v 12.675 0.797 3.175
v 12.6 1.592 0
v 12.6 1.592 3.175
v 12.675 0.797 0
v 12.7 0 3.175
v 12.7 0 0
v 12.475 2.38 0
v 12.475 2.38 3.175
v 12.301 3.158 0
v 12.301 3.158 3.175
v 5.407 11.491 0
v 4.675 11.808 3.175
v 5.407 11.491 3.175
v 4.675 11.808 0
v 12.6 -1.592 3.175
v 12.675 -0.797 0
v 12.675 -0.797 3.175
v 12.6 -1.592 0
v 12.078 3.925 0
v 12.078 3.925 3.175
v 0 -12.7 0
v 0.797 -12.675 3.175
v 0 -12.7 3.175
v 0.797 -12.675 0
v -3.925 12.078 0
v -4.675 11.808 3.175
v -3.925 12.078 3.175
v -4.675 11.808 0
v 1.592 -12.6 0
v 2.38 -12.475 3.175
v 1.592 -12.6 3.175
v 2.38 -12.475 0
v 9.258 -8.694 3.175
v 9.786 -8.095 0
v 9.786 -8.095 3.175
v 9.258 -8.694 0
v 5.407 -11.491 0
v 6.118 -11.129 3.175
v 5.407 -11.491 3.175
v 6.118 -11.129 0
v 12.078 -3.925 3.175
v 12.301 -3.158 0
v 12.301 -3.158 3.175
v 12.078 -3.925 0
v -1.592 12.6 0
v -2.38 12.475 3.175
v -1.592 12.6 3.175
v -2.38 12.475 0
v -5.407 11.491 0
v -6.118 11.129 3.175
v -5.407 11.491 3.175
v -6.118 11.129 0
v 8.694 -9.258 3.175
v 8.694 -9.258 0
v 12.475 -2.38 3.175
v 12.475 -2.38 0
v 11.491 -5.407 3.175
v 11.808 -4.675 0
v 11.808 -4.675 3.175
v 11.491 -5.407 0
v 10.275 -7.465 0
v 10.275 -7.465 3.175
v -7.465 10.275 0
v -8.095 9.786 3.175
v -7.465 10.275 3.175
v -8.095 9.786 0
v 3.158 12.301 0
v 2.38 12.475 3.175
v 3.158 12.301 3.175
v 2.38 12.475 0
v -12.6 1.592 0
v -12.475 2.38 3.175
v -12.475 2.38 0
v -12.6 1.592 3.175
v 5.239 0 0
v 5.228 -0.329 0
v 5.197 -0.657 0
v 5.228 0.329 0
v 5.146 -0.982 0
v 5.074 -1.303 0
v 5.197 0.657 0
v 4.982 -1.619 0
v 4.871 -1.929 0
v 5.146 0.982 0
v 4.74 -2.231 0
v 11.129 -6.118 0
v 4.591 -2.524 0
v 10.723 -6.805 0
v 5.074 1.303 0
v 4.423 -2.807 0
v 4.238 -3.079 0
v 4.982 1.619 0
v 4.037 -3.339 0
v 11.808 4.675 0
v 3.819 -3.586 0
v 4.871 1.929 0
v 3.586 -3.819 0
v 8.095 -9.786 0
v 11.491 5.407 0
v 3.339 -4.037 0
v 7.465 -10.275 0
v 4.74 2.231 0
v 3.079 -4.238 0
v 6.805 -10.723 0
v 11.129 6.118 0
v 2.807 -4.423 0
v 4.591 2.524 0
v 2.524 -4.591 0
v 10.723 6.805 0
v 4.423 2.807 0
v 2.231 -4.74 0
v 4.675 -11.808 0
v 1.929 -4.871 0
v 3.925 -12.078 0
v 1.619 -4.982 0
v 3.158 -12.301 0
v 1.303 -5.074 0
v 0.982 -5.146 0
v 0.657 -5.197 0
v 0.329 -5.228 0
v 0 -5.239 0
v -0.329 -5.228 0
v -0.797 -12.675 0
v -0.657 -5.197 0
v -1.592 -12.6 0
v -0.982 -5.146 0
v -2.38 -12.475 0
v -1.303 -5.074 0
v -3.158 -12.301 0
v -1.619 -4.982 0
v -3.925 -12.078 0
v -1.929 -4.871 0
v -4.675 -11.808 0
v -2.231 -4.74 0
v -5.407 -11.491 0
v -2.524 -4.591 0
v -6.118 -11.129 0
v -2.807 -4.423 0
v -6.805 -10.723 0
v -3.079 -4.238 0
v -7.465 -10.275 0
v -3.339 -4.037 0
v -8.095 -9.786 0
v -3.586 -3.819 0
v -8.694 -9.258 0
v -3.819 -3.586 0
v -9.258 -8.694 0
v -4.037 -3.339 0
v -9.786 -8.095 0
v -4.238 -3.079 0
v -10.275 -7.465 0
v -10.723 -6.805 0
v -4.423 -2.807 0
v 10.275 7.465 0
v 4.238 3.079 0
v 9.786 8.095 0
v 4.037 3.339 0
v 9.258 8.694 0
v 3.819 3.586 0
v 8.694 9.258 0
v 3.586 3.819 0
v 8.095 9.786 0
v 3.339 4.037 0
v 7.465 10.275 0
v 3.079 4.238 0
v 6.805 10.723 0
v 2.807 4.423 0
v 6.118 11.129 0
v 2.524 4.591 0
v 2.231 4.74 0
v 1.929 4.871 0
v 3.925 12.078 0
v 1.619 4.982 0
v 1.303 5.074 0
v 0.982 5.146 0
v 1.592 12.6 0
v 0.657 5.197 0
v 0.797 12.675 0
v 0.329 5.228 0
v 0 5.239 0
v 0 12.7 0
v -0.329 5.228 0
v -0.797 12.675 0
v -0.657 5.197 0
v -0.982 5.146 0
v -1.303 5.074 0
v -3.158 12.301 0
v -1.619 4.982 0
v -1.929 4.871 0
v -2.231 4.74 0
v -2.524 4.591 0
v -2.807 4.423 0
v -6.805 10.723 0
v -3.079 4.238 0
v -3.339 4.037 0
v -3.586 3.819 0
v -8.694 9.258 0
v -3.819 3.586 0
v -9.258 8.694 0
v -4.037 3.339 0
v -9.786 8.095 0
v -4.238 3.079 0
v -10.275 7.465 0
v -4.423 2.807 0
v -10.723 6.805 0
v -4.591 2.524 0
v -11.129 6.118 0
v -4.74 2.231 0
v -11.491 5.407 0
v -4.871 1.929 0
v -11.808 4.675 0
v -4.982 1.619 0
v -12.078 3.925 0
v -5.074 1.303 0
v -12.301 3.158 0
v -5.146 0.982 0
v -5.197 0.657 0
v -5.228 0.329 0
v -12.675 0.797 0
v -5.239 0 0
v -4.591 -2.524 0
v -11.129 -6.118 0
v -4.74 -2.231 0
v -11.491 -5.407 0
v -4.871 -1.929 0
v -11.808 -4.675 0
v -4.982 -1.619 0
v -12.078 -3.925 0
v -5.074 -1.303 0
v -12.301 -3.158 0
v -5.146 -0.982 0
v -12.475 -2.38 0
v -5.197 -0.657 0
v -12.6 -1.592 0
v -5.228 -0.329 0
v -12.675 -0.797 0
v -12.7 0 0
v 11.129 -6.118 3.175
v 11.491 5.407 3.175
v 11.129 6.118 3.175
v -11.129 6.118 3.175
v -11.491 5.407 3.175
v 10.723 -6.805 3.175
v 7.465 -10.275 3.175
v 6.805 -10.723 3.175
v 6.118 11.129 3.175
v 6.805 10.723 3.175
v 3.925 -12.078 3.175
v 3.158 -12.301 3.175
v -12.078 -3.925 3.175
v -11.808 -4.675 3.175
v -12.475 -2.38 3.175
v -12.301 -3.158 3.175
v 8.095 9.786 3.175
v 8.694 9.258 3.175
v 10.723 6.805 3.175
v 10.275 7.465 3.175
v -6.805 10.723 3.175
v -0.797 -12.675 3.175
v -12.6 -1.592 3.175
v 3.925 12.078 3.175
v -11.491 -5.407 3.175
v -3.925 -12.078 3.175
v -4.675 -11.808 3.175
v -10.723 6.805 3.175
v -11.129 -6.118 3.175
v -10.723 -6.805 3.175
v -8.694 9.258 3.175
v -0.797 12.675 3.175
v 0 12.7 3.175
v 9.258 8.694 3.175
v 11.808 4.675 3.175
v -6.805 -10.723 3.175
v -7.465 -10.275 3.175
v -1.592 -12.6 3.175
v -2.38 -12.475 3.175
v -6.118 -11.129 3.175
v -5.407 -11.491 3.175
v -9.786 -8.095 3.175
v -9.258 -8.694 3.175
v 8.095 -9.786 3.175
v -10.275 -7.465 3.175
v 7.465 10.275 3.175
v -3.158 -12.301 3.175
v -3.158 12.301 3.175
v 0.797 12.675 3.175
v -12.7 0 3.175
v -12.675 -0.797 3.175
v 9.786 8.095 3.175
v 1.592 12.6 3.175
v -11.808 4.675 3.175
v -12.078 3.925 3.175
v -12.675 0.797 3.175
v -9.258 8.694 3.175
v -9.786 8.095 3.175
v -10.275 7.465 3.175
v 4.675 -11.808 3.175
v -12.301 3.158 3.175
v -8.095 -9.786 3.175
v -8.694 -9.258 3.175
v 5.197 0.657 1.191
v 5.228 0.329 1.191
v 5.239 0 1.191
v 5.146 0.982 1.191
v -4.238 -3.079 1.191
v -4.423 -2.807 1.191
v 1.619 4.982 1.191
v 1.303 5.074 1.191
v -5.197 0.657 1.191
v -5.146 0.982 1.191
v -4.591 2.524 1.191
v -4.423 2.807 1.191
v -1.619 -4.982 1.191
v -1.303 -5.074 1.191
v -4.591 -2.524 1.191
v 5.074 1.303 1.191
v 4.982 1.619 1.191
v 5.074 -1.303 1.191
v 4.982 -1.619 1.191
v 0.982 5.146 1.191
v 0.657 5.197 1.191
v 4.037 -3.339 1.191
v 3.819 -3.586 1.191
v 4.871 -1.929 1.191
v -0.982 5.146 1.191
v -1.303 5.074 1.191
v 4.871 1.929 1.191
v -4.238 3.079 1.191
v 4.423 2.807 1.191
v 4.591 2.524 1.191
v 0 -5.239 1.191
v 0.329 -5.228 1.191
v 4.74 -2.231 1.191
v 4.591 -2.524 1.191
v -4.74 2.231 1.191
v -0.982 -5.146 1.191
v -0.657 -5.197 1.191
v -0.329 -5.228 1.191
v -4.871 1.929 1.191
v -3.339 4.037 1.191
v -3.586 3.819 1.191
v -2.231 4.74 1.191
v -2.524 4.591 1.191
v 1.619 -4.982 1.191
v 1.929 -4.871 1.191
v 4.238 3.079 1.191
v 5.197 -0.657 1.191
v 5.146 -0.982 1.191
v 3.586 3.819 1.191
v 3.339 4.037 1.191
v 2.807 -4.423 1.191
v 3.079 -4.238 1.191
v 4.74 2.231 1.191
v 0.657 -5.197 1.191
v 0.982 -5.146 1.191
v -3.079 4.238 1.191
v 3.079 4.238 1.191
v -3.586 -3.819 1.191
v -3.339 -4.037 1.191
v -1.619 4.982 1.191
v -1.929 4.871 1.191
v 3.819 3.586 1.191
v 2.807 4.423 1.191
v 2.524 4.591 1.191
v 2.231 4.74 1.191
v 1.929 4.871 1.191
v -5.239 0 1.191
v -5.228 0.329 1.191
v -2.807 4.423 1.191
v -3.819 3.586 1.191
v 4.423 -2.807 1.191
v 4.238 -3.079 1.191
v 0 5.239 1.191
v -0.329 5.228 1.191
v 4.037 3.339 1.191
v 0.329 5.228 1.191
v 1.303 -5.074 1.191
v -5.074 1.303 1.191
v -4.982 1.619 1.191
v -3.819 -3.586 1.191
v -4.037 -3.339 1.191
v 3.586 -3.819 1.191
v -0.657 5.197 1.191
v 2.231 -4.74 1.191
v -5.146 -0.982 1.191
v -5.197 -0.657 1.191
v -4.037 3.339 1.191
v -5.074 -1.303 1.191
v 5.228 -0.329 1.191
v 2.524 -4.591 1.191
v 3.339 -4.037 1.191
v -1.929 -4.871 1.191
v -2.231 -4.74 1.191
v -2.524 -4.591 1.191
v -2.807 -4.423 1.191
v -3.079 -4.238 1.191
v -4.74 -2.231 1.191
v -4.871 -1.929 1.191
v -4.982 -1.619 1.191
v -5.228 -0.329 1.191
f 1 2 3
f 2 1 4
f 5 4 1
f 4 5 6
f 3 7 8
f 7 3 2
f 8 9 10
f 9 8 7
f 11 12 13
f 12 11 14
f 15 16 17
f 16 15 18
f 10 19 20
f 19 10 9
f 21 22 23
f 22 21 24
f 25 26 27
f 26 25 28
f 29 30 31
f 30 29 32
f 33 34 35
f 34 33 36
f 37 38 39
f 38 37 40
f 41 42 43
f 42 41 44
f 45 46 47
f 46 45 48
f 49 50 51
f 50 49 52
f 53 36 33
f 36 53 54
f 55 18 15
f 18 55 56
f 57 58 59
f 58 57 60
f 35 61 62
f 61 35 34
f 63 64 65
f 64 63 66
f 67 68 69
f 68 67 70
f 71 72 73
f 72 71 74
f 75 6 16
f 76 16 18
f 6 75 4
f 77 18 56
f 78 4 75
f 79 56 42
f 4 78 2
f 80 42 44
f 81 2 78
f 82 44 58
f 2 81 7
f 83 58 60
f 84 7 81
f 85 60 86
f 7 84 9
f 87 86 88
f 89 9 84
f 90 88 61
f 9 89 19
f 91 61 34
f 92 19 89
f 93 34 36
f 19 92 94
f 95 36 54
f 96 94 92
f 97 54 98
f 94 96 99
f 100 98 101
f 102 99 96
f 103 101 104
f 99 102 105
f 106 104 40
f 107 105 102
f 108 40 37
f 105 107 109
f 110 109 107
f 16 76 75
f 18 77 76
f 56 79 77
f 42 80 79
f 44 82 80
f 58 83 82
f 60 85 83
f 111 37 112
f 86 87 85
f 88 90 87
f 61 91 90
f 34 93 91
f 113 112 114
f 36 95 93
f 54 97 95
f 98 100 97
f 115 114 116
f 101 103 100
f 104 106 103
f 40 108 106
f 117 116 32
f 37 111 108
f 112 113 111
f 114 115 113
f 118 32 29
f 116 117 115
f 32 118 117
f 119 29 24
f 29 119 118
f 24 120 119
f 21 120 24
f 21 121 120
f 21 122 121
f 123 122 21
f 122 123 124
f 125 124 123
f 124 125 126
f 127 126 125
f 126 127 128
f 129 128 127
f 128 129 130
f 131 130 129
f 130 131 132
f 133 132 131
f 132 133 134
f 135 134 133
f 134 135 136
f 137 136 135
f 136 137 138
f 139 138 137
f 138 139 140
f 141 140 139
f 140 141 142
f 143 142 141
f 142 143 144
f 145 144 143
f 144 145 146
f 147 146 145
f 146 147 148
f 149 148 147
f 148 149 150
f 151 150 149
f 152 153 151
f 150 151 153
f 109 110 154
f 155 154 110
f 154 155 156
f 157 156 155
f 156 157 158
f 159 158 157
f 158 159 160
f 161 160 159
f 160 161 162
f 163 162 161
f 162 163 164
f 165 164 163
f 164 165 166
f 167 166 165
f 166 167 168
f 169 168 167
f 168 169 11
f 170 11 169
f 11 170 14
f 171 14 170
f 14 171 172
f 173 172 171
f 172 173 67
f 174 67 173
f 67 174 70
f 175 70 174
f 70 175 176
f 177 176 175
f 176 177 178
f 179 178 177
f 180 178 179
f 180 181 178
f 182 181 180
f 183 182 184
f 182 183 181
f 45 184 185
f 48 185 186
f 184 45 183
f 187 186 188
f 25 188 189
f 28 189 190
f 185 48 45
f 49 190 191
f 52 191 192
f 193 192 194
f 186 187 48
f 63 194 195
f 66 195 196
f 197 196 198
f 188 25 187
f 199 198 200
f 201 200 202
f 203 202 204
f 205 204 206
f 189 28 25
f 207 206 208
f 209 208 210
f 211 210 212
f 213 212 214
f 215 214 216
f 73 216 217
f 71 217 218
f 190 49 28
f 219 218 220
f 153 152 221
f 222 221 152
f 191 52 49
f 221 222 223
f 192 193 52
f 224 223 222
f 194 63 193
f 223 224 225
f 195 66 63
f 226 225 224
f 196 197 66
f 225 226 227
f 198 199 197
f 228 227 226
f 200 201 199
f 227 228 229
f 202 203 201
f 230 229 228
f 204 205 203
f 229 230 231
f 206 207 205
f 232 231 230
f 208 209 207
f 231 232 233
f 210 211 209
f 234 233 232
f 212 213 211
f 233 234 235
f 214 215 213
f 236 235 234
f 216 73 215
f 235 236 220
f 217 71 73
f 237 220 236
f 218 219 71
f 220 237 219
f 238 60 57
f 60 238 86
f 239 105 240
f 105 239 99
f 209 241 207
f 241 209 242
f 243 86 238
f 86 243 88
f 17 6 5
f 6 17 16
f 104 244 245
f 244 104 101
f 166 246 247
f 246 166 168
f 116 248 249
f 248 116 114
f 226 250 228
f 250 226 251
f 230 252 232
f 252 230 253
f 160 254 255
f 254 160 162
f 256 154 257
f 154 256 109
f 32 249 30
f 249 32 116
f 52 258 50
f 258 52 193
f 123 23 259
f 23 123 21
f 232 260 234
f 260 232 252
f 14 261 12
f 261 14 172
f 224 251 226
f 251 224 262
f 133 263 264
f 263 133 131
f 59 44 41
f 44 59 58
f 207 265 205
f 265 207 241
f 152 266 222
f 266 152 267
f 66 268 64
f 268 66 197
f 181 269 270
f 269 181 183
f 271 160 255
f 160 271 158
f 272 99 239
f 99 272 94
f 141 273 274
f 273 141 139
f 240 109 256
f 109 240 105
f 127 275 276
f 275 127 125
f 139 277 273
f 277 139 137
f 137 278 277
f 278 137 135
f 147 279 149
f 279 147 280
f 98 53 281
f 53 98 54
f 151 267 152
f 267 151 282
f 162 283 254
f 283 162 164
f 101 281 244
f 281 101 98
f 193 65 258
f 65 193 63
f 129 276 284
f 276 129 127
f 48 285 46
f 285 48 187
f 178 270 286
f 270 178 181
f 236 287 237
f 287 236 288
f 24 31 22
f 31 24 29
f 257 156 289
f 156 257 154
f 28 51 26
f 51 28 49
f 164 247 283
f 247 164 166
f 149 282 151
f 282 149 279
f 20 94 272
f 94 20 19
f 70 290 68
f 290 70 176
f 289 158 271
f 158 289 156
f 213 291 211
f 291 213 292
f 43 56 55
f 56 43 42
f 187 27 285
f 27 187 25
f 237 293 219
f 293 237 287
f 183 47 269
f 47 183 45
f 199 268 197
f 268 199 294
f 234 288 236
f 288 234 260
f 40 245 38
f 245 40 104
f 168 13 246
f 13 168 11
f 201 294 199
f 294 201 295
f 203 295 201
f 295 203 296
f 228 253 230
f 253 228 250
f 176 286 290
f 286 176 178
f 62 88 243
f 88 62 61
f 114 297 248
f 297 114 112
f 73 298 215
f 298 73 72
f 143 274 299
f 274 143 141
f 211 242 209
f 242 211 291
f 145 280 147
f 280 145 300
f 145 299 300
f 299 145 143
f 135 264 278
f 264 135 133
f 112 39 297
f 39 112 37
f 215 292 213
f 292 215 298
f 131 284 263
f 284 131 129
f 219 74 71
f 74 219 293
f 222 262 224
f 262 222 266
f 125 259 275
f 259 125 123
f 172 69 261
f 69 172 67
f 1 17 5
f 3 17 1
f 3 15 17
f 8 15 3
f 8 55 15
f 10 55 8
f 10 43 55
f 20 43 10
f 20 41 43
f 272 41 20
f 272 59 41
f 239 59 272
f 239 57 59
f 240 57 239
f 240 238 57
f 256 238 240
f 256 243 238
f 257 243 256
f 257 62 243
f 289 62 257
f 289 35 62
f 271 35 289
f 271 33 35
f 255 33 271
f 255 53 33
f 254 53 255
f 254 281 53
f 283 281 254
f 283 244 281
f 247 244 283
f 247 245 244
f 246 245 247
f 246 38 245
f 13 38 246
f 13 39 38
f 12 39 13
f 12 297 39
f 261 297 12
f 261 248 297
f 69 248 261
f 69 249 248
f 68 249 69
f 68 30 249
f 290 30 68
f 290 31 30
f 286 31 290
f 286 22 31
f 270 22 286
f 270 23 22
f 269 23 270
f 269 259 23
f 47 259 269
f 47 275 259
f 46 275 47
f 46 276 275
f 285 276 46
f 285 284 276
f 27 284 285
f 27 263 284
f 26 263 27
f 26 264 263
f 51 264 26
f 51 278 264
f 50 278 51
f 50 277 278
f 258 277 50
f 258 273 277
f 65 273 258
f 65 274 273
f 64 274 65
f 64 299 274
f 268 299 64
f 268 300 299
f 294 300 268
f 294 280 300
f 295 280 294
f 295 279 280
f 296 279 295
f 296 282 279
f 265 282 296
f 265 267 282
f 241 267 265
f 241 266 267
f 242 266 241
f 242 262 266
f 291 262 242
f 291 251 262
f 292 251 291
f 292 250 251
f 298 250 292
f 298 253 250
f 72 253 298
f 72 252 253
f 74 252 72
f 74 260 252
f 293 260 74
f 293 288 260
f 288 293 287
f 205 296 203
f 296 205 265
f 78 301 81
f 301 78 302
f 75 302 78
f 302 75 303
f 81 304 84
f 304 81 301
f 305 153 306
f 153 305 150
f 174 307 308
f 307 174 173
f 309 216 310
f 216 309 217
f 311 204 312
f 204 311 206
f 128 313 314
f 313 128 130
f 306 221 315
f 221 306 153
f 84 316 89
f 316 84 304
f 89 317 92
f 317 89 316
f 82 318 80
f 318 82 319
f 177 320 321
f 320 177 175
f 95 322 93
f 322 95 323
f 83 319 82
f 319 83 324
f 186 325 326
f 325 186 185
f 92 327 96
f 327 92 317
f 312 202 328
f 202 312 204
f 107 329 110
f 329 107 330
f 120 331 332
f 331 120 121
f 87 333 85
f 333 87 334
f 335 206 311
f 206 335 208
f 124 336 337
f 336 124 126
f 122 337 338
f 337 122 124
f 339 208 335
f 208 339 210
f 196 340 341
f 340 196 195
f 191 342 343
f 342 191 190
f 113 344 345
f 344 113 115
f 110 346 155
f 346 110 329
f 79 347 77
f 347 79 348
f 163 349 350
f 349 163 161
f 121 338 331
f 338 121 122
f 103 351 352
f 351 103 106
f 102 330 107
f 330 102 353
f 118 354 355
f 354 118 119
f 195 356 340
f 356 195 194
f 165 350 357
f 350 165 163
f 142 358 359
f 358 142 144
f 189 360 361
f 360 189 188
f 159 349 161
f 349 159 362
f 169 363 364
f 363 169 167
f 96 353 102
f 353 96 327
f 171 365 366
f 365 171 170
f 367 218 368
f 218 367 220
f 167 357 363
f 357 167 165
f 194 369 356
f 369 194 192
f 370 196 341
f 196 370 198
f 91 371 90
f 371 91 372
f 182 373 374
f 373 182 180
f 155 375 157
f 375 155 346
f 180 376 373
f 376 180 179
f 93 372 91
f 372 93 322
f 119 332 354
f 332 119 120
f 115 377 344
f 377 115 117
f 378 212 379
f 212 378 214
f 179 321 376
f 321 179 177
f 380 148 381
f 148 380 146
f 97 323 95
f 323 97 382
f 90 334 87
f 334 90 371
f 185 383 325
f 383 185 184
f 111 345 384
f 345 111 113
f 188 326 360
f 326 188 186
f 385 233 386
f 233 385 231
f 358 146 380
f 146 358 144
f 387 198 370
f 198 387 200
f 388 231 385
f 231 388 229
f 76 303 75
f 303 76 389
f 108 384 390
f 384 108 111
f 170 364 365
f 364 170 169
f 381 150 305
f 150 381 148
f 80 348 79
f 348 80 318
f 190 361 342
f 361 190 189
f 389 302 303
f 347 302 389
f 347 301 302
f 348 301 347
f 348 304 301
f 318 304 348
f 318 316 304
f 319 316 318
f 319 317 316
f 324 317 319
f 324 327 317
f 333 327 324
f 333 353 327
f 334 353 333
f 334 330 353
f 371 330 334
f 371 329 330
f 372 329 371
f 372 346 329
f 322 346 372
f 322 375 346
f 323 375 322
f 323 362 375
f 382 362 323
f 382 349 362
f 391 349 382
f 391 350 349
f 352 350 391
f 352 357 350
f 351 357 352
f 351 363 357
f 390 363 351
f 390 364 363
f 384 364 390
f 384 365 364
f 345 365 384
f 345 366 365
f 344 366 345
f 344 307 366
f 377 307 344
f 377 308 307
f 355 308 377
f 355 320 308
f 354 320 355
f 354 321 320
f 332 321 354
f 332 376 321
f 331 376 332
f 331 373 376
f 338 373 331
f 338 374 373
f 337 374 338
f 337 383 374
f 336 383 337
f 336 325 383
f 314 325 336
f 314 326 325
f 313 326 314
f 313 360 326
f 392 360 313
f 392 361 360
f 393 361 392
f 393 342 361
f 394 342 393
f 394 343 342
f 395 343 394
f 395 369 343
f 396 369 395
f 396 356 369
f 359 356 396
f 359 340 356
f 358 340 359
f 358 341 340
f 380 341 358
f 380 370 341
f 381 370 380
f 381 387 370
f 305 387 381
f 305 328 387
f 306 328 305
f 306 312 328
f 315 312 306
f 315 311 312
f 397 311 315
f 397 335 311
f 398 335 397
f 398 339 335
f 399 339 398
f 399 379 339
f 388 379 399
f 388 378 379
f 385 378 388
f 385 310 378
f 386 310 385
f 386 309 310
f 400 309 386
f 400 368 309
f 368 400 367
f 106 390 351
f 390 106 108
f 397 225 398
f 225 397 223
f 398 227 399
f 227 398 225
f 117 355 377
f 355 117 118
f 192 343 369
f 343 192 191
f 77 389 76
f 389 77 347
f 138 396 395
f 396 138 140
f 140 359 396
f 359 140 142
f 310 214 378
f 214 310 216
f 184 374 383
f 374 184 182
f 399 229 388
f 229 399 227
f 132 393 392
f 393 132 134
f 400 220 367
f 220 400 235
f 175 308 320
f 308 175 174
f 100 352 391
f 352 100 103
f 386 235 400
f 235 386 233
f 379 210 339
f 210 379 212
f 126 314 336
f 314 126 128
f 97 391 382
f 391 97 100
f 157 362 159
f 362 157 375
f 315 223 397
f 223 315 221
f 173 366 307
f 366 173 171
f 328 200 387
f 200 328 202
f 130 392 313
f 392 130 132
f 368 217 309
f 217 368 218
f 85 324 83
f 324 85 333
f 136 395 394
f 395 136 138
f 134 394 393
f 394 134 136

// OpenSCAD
inch = 25.4;
$fn = 100;

difference() {
    cylinder(h = inch * 1/8, r = inch * 1/2);
    cylinder(h = inch * 3/64, r = 1.1 * inch * 3/16);
}
